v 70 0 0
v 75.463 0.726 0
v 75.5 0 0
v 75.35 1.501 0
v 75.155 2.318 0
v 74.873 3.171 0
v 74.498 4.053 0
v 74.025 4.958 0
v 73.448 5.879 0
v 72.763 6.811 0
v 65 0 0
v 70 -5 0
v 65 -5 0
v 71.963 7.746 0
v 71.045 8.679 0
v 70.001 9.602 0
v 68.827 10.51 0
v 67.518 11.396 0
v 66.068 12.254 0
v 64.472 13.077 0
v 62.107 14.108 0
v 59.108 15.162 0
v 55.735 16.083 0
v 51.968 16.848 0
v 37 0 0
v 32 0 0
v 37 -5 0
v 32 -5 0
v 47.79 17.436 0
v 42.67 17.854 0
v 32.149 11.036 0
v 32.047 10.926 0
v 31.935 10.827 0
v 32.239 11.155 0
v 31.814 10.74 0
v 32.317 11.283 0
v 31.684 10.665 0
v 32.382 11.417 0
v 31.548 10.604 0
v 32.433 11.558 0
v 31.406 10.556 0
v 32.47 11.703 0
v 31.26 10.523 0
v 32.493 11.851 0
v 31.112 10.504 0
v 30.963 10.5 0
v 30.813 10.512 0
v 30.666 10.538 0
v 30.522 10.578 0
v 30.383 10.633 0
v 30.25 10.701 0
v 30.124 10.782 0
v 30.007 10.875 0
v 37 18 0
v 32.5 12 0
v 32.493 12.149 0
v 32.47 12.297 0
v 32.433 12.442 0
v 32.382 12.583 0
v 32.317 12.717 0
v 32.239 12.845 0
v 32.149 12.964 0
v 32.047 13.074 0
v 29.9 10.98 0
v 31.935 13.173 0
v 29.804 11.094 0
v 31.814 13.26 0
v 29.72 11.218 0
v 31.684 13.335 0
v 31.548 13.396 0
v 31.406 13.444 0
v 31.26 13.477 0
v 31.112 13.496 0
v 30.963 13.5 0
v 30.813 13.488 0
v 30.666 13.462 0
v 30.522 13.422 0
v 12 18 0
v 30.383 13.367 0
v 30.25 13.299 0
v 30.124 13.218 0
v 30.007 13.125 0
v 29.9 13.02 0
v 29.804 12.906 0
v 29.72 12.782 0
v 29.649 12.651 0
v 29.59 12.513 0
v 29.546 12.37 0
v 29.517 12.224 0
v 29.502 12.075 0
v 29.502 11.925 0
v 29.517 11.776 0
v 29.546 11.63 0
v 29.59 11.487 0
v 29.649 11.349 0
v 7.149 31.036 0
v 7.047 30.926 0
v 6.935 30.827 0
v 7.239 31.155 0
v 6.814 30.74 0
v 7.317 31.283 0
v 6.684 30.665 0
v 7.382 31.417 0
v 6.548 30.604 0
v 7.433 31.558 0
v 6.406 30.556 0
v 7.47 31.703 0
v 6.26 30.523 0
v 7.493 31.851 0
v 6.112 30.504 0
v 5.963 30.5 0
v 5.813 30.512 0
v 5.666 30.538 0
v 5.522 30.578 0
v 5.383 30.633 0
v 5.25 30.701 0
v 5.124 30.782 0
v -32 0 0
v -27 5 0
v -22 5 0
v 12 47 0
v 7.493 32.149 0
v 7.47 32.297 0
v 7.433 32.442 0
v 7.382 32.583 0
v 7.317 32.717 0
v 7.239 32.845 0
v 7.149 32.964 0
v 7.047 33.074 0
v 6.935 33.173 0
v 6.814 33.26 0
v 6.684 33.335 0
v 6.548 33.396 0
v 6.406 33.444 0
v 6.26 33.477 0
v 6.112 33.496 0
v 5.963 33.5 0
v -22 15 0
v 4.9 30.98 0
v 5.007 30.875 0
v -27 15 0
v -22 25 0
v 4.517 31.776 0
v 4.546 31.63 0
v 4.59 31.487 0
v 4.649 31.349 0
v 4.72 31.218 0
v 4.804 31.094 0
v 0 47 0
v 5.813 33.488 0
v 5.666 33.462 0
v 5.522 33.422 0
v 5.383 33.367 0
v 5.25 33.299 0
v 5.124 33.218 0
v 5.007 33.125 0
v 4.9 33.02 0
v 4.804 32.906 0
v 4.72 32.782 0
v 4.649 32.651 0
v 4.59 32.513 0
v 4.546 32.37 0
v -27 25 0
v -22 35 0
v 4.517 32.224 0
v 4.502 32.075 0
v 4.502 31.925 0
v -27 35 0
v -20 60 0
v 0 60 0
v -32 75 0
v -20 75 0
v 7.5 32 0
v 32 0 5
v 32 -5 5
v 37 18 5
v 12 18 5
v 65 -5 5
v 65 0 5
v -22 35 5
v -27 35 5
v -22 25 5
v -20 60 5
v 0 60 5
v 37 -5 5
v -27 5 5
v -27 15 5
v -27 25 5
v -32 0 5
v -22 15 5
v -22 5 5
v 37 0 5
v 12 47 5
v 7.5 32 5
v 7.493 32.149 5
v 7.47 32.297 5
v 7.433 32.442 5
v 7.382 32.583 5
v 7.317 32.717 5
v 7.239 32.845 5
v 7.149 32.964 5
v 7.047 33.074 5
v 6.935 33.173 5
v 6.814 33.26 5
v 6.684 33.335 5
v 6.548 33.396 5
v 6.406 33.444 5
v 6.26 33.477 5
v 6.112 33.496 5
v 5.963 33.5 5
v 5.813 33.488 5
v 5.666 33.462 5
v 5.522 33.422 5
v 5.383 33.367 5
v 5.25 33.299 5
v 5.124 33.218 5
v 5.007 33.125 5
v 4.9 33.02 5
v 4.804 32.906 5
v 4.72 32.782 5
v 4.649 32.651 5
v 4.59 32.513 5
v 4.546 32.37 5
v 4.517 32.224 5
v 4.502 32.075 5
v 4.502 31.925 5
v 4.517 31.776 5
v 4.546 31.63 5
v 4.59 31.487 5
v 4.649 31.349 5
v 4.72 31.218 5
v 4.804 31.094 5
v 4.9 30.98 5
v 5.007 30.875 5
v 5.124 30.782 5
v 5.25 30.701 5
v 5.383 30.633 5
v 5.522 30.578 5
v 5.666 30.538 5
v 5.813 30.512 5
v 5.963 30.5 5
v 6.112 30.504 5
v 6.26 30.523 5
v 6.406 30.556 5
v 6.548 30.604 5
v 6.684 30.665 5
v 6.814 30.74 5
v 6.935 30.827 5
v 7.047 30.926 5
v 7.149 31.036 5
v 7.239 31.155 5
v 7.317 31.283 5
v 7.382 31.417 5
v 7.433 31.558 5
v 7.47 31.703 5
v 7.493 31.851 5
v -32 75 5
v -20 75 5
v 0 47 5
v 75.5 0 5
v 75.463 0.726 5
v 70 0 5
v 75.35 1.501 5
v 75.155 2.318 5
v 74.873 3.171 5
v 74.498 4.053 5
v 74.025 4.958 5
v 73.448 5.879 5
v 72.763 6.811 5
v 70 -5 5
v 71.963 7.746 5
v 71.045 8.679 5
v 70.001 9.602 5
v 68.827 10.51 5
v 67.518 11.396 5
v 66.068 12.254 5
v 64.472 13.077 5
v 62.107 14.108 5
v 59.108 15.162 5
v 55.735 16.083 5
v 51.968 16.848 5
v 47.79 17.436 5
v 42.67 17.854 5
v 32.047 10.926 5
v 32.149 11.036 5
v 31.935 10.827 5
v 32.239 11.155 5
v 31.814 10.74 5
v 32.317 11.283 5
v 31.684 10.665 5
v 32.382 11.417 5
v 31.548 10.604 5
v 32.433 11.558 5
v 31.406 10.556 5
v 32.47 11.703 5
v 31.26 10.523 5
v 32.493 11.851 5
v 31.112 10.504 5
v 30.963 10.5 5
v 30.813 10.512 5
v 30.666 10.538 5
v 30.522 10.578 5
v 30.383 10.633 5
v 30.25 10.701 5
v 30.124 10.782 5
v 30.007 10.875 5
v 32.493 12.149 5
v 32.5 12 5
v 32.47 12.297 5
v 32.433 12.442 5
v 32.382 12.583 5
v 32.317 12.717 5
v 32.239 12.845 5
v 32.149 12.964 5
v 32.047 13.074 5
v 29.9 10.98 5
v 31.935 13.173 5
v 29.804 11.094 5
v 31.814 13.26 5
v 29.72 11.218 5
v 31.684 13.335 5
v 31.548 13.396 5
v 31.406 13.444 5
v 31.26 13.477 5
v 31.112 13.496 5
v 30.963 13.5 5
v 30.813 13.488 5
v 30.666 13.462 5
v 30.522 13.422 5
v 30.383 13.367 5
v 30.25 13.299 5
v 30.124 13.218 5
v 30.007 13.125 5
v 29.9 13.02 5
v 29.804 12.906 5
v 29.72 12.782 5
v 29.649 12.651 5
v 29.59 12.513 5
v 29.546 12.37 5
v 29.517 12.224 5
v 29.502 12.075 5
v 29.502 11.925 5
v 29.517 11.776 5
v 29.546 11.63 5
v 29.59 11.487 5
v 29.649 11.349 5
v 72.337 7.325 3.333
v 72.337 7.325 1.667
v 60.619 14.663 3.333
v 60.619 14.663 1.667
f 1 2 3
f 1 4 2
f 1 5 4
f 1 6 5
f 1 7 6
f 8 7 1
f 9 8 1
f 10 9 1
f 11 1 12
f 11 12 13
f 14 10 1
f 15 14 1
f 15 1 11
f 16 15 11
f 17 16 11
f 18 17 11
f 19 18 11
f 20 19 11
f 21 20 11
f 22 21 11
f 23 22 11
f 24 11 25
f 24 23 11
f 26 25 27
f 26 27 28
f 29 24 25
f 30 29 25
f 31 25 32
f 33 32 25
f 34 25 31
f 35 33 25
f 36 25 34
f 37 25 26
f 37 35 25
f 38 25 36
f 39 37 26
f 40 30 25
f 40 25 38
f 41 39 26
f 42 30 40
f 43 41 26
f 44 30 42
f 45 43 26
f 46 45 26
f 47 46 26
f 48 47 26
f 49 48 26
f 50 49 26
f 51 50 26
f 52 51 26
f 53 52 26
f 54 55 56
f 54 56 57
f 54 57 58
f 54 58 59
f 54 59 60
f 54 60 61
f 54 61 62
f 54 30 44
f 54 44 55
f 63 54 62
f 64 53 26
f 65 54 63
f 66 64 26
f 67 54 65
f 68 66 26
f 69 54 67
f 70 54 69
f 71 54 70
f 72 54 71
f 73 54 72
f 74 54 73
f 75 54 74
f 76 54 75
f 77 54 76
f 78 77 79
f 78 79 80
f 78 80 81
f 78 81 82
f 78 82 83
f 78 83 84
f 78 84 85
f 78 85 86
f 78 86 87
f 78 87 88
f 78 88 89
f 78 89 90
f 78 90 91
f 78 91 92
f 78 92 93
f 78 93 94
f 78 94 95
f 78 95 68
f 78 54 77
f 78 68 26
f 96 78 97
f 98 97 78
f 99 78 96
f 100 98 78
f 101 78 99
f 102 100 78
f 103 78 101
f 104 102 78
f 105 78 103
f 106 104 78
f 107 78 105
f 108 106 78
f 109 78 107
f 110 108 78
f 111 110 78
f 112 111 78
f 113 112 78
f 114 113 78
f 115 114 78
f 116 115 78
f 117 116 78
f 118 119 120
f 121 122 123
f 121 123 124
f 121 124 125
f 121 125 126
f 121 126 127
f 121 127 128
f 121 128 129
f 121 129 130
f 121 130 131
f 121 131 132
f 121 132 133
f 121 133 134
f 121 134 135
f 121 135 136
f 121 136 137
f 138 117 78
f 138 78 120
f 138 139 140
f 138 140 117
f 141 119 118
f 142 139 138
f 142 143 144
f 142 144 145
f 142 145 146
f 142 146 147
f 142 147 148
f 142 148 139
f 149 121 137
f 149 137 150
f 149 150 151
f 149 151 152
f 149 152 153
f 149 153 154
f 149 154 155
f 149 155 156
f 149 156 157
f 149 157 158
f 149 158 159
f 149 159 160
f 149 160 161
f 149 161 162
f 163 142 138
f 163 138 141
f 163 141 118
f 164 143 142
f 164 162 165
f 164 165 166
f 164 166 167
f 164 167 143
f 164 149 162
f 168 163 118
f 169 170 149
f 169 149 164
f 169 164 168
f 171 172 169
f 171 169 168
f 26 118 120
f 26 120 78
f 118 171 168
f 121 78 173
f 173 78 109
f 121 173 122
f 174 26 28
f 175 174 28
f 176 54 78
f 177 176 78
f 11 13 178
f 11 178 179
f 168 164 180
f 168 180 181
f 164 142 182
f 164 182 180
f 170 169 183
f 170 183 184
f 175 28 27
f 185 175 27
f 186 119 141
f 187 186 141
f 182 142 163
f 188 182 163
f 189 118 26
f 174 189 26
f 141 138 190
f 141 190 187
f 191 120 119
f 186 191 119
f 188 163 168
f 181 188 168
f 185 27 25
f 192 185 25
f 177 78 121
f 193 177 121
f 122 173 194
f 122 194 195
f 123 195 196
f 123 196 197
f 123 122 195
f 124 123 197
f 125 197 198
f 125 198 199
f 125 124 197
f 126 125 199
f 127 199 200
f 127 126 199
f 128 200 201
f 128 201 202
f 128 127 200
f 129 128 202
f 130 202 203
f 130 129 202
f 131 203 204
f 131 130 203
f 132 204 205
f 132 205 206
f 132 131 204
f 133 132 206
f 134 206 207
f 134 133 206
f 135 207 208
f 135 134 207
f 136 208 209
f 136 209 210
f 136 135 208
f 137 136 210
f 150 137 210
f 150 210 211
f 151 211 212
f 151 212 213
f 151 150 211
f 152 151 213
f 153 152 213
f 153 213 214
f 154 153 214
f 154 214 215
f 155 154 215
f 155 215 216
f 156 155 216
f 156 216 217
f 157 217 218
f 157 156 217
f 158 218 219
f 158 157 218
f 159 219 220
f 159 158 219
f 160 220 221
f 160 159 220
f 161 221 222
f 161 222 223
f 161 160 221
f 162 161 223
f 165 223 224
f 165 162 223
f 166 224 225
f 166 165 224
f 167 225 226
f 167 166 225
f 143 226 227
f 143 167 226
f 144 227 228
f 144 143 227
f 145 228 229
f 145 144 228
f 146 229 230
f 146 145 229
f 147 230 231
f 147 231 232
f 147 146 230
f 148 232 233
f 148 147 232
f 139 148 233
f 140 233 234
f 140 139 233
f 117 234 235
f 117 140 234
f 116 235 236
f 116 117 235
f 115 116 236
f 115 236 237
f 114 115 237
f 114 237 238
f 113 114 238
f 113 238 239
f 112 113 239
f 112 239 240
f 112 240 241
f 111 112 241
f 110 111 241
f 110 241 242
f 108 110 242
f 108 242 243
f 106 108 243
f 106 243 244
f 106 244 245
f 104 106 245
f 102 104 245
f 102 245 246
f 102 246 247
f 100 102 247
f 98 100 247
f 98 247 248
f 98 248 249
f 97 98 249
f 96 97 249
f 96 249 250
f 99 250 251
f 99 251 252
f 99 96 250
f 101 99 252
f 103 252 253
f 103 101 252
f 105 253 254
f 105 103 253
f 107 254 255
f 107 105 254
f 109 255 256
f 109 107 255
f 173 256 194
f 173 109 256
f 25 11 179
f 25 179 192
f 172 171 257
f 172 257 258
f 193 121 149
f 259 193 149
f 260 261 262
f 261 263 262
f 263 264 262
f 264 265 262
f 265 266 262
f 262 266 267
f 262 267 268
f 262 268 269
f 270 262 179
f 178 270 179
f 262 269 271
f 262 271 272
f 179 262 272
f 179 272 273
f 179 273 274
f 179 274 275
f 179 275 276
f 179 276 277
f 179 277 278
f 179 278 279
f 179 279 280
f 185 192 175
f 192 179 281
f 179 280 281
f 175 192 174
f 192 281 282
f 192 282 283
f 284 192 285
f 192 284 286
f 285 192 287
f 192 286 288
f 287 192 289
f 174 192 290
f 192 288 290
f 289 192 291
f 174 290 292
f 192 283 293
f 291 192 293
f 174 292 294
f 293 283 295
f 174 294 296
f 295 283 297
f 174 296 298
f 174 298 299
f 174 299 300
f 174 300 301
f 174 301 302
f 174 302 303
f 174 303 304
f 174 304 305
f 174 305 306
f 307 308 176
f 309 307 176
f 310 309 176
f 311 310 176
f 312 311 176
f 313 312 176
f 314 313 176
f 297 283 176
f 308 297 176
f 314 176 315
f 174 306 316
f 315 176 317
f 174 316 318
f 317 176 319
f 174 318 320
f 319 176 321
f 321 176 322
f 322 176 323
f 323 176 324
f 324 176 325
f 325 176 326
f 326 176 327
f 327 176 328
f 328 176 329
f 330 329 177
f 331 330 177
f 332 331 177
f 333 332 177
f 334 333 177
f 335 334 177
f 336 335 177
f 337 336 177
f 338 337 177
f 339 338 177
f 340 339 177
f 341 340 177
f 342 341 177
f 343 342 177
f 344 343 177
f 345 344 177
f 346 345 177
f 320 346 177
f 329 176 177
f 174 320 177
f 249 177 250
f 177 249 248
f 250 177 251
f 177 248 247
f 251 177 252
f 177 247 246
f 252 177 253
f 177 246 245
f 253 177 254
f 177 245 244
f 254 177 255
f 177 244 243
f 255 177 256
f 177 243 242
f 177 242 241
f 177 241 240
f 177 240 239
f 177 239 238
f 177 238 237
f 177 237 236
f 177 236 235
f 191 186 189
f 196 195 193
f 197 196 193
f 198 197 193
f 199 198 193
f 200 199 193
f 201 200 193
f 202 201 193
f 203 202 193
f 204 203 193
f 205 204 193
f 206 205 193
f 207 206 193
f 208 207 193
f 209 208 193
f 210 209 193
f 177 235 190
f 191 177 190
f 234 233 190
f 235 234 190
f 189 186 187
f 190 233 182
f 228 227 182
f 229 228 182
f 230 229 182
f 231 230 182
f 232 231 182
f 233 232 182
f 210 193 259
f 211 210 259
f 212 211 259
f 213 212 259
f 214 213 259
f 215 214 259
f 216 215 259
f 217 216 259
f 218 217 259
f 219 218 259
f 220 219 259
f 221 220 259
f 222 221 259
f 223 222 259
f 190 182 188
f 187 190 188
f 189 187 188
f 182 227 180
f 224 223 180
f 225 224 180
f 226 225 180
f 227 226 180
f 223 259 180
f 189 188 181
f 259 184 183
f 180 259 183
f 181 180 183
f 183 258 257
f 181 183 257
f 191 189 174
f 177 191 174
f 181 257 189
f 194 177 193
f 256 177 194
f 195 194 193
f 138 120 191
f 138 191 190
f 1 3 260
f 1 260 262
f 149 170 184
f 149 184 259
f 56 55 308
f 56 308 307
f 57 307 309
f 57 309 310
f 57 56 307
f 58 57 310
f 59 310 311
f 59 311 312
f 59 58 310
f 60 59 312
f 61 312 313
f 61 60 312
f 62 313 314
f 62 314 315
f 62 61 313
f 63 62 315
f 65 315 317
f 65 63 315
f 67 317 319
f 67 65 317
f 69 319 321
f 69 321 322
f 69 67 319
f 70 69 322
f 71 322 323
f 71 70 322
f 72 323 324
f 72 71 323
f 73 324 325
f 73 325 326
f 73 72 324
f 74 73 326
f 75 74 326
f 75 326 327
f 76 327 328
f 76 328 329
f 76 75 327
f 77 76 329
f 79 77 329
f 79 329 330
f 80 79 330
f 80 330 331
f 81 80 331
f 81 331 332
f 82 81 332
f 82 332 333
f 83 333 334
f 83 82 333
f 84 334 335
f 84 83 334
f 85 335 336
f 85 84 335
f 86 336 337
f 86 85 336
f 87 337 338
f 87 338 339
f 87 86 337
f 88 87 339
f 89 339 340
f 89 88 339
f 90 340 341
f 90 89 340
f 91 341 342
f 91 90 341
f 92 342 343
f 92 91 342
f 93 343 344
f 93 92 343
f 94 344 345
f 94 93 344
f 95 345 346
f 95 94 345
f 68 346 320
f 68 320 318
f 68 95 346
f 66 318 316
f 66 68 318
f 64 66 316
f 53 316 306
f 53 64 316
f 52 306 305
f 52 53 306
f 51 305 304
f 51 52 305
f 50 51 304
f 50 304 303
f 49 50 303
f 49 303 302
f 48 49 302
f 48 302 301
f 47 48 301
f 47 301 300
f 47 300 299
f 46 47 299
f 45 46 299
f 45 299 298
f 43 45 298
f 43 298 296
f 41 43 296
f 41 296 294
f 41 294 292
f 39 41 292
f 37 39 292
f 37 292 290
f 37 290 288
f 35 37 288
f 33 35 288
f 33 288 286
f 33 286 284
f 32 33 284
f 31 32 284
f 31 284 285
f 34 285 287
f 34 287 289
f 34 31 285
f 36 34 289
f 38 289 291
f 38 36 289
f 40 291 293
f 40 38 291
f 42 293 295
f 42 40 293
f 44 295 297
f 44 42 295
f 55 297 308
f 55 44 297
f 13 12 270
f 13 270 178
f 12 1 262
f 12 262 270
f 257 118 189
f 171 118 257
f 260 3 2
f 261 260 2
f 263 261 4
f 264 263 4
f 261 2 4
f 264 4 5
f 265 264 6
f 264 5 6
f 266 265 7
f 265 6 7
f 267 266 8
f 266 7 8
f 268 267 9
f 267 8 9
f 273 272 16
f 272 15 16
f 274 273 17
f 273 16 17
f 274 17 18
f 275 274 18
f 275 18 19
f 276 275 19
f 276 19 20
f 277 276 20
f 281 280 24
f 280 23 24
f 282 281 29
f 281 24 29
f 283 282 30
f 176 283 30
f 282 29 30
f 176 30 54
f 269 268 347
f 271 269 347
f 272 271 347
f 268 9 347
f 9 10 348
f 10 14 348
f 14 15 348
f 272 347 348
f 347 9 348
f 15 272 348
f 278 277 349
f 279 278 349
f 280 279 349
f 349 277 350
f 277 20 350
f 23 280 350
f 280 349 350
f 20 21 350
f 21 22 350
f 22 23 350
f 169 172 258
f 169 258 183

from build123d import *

# Parameters (mm, degrees)
ESQUISSE1_R        = 1.5
BOSS_EXTRU_1_DEPTH = 5
ESQUISSE2_W        = 5
ESQUISSE2_H        = 10
BOSS_EXTRU_2_DEPTH = 5


with BuildPart() as part:
    # Esquisse1 → Boss.-Extru.1 (new body)
    with BuildSketch(Plane.XY):
        Polygon((0, 0), (32, 0), (32, -5), (37, -5), (37, 0), (37, 18), (12, 18), (12, 47), (0, 47), align=None)
        with Locations((6, 32)):
            Circle(ESQUISSE1_R, mode=Mode.SUBTRACT)
        with Locations((31, 12)):
            Circle(ESQUISSE1_R, mode=Mode.SUBTRACT)
    extrude(amount=BOSS_EXTRU_1_DEPTH)

    # Esquisse2 → Boss.-Extru.2 (add)
    # profile 1 of 2: a face of its own
    with BuildSketch(Plane(origin=(0, 0, 0), x_dir=(-1, 0, 0), z_dir=(0, 0, -1))):
        with BuildLine():
            Line((-65, 0), (-37, 0))
            Line((-37, 0), (-37, 18))
            add(Edge.make_bspline(
                [(-75.5, 0), (-75.5, 5.982232529), (-67.685409636, 18), (-37, 18)],
                knots=[0, 0, 0, 0, 1, 1, 1, 1], degree=3))
            Line((-75.5, 0), (-70, 0))
            Line((-70, 0), (-70, -5))
            Line((-70, -5), (-65, -5))
            Line((-65, -5), (-65, 0))
        make_face()
    # profile 2 of 2: a face of its own
    with BuildSketch(Plane(origin=(0, 0, 0), x_dir=(-1, 0, 0), z_dir=(0, 0, -1))):
        Polygon((0, 60), (0, 0), (32, 0), (32, 75), (20, 75), (20, 60), align=None)
        with Locations((24.5, 10)):
            Rectangle(ESQUISSE2_W, ESQUISSE2_H, mode=Mode.SUBTRACT)
        with Locations((24.5, 30)):
            Rectangle(ESQUISSE2_W, ESQUISSE2_H, mode=Mode.SUBTRACT)
    extrude(amount=-BOSS_EXTRU_2_DEPTH)


solid = part.part
